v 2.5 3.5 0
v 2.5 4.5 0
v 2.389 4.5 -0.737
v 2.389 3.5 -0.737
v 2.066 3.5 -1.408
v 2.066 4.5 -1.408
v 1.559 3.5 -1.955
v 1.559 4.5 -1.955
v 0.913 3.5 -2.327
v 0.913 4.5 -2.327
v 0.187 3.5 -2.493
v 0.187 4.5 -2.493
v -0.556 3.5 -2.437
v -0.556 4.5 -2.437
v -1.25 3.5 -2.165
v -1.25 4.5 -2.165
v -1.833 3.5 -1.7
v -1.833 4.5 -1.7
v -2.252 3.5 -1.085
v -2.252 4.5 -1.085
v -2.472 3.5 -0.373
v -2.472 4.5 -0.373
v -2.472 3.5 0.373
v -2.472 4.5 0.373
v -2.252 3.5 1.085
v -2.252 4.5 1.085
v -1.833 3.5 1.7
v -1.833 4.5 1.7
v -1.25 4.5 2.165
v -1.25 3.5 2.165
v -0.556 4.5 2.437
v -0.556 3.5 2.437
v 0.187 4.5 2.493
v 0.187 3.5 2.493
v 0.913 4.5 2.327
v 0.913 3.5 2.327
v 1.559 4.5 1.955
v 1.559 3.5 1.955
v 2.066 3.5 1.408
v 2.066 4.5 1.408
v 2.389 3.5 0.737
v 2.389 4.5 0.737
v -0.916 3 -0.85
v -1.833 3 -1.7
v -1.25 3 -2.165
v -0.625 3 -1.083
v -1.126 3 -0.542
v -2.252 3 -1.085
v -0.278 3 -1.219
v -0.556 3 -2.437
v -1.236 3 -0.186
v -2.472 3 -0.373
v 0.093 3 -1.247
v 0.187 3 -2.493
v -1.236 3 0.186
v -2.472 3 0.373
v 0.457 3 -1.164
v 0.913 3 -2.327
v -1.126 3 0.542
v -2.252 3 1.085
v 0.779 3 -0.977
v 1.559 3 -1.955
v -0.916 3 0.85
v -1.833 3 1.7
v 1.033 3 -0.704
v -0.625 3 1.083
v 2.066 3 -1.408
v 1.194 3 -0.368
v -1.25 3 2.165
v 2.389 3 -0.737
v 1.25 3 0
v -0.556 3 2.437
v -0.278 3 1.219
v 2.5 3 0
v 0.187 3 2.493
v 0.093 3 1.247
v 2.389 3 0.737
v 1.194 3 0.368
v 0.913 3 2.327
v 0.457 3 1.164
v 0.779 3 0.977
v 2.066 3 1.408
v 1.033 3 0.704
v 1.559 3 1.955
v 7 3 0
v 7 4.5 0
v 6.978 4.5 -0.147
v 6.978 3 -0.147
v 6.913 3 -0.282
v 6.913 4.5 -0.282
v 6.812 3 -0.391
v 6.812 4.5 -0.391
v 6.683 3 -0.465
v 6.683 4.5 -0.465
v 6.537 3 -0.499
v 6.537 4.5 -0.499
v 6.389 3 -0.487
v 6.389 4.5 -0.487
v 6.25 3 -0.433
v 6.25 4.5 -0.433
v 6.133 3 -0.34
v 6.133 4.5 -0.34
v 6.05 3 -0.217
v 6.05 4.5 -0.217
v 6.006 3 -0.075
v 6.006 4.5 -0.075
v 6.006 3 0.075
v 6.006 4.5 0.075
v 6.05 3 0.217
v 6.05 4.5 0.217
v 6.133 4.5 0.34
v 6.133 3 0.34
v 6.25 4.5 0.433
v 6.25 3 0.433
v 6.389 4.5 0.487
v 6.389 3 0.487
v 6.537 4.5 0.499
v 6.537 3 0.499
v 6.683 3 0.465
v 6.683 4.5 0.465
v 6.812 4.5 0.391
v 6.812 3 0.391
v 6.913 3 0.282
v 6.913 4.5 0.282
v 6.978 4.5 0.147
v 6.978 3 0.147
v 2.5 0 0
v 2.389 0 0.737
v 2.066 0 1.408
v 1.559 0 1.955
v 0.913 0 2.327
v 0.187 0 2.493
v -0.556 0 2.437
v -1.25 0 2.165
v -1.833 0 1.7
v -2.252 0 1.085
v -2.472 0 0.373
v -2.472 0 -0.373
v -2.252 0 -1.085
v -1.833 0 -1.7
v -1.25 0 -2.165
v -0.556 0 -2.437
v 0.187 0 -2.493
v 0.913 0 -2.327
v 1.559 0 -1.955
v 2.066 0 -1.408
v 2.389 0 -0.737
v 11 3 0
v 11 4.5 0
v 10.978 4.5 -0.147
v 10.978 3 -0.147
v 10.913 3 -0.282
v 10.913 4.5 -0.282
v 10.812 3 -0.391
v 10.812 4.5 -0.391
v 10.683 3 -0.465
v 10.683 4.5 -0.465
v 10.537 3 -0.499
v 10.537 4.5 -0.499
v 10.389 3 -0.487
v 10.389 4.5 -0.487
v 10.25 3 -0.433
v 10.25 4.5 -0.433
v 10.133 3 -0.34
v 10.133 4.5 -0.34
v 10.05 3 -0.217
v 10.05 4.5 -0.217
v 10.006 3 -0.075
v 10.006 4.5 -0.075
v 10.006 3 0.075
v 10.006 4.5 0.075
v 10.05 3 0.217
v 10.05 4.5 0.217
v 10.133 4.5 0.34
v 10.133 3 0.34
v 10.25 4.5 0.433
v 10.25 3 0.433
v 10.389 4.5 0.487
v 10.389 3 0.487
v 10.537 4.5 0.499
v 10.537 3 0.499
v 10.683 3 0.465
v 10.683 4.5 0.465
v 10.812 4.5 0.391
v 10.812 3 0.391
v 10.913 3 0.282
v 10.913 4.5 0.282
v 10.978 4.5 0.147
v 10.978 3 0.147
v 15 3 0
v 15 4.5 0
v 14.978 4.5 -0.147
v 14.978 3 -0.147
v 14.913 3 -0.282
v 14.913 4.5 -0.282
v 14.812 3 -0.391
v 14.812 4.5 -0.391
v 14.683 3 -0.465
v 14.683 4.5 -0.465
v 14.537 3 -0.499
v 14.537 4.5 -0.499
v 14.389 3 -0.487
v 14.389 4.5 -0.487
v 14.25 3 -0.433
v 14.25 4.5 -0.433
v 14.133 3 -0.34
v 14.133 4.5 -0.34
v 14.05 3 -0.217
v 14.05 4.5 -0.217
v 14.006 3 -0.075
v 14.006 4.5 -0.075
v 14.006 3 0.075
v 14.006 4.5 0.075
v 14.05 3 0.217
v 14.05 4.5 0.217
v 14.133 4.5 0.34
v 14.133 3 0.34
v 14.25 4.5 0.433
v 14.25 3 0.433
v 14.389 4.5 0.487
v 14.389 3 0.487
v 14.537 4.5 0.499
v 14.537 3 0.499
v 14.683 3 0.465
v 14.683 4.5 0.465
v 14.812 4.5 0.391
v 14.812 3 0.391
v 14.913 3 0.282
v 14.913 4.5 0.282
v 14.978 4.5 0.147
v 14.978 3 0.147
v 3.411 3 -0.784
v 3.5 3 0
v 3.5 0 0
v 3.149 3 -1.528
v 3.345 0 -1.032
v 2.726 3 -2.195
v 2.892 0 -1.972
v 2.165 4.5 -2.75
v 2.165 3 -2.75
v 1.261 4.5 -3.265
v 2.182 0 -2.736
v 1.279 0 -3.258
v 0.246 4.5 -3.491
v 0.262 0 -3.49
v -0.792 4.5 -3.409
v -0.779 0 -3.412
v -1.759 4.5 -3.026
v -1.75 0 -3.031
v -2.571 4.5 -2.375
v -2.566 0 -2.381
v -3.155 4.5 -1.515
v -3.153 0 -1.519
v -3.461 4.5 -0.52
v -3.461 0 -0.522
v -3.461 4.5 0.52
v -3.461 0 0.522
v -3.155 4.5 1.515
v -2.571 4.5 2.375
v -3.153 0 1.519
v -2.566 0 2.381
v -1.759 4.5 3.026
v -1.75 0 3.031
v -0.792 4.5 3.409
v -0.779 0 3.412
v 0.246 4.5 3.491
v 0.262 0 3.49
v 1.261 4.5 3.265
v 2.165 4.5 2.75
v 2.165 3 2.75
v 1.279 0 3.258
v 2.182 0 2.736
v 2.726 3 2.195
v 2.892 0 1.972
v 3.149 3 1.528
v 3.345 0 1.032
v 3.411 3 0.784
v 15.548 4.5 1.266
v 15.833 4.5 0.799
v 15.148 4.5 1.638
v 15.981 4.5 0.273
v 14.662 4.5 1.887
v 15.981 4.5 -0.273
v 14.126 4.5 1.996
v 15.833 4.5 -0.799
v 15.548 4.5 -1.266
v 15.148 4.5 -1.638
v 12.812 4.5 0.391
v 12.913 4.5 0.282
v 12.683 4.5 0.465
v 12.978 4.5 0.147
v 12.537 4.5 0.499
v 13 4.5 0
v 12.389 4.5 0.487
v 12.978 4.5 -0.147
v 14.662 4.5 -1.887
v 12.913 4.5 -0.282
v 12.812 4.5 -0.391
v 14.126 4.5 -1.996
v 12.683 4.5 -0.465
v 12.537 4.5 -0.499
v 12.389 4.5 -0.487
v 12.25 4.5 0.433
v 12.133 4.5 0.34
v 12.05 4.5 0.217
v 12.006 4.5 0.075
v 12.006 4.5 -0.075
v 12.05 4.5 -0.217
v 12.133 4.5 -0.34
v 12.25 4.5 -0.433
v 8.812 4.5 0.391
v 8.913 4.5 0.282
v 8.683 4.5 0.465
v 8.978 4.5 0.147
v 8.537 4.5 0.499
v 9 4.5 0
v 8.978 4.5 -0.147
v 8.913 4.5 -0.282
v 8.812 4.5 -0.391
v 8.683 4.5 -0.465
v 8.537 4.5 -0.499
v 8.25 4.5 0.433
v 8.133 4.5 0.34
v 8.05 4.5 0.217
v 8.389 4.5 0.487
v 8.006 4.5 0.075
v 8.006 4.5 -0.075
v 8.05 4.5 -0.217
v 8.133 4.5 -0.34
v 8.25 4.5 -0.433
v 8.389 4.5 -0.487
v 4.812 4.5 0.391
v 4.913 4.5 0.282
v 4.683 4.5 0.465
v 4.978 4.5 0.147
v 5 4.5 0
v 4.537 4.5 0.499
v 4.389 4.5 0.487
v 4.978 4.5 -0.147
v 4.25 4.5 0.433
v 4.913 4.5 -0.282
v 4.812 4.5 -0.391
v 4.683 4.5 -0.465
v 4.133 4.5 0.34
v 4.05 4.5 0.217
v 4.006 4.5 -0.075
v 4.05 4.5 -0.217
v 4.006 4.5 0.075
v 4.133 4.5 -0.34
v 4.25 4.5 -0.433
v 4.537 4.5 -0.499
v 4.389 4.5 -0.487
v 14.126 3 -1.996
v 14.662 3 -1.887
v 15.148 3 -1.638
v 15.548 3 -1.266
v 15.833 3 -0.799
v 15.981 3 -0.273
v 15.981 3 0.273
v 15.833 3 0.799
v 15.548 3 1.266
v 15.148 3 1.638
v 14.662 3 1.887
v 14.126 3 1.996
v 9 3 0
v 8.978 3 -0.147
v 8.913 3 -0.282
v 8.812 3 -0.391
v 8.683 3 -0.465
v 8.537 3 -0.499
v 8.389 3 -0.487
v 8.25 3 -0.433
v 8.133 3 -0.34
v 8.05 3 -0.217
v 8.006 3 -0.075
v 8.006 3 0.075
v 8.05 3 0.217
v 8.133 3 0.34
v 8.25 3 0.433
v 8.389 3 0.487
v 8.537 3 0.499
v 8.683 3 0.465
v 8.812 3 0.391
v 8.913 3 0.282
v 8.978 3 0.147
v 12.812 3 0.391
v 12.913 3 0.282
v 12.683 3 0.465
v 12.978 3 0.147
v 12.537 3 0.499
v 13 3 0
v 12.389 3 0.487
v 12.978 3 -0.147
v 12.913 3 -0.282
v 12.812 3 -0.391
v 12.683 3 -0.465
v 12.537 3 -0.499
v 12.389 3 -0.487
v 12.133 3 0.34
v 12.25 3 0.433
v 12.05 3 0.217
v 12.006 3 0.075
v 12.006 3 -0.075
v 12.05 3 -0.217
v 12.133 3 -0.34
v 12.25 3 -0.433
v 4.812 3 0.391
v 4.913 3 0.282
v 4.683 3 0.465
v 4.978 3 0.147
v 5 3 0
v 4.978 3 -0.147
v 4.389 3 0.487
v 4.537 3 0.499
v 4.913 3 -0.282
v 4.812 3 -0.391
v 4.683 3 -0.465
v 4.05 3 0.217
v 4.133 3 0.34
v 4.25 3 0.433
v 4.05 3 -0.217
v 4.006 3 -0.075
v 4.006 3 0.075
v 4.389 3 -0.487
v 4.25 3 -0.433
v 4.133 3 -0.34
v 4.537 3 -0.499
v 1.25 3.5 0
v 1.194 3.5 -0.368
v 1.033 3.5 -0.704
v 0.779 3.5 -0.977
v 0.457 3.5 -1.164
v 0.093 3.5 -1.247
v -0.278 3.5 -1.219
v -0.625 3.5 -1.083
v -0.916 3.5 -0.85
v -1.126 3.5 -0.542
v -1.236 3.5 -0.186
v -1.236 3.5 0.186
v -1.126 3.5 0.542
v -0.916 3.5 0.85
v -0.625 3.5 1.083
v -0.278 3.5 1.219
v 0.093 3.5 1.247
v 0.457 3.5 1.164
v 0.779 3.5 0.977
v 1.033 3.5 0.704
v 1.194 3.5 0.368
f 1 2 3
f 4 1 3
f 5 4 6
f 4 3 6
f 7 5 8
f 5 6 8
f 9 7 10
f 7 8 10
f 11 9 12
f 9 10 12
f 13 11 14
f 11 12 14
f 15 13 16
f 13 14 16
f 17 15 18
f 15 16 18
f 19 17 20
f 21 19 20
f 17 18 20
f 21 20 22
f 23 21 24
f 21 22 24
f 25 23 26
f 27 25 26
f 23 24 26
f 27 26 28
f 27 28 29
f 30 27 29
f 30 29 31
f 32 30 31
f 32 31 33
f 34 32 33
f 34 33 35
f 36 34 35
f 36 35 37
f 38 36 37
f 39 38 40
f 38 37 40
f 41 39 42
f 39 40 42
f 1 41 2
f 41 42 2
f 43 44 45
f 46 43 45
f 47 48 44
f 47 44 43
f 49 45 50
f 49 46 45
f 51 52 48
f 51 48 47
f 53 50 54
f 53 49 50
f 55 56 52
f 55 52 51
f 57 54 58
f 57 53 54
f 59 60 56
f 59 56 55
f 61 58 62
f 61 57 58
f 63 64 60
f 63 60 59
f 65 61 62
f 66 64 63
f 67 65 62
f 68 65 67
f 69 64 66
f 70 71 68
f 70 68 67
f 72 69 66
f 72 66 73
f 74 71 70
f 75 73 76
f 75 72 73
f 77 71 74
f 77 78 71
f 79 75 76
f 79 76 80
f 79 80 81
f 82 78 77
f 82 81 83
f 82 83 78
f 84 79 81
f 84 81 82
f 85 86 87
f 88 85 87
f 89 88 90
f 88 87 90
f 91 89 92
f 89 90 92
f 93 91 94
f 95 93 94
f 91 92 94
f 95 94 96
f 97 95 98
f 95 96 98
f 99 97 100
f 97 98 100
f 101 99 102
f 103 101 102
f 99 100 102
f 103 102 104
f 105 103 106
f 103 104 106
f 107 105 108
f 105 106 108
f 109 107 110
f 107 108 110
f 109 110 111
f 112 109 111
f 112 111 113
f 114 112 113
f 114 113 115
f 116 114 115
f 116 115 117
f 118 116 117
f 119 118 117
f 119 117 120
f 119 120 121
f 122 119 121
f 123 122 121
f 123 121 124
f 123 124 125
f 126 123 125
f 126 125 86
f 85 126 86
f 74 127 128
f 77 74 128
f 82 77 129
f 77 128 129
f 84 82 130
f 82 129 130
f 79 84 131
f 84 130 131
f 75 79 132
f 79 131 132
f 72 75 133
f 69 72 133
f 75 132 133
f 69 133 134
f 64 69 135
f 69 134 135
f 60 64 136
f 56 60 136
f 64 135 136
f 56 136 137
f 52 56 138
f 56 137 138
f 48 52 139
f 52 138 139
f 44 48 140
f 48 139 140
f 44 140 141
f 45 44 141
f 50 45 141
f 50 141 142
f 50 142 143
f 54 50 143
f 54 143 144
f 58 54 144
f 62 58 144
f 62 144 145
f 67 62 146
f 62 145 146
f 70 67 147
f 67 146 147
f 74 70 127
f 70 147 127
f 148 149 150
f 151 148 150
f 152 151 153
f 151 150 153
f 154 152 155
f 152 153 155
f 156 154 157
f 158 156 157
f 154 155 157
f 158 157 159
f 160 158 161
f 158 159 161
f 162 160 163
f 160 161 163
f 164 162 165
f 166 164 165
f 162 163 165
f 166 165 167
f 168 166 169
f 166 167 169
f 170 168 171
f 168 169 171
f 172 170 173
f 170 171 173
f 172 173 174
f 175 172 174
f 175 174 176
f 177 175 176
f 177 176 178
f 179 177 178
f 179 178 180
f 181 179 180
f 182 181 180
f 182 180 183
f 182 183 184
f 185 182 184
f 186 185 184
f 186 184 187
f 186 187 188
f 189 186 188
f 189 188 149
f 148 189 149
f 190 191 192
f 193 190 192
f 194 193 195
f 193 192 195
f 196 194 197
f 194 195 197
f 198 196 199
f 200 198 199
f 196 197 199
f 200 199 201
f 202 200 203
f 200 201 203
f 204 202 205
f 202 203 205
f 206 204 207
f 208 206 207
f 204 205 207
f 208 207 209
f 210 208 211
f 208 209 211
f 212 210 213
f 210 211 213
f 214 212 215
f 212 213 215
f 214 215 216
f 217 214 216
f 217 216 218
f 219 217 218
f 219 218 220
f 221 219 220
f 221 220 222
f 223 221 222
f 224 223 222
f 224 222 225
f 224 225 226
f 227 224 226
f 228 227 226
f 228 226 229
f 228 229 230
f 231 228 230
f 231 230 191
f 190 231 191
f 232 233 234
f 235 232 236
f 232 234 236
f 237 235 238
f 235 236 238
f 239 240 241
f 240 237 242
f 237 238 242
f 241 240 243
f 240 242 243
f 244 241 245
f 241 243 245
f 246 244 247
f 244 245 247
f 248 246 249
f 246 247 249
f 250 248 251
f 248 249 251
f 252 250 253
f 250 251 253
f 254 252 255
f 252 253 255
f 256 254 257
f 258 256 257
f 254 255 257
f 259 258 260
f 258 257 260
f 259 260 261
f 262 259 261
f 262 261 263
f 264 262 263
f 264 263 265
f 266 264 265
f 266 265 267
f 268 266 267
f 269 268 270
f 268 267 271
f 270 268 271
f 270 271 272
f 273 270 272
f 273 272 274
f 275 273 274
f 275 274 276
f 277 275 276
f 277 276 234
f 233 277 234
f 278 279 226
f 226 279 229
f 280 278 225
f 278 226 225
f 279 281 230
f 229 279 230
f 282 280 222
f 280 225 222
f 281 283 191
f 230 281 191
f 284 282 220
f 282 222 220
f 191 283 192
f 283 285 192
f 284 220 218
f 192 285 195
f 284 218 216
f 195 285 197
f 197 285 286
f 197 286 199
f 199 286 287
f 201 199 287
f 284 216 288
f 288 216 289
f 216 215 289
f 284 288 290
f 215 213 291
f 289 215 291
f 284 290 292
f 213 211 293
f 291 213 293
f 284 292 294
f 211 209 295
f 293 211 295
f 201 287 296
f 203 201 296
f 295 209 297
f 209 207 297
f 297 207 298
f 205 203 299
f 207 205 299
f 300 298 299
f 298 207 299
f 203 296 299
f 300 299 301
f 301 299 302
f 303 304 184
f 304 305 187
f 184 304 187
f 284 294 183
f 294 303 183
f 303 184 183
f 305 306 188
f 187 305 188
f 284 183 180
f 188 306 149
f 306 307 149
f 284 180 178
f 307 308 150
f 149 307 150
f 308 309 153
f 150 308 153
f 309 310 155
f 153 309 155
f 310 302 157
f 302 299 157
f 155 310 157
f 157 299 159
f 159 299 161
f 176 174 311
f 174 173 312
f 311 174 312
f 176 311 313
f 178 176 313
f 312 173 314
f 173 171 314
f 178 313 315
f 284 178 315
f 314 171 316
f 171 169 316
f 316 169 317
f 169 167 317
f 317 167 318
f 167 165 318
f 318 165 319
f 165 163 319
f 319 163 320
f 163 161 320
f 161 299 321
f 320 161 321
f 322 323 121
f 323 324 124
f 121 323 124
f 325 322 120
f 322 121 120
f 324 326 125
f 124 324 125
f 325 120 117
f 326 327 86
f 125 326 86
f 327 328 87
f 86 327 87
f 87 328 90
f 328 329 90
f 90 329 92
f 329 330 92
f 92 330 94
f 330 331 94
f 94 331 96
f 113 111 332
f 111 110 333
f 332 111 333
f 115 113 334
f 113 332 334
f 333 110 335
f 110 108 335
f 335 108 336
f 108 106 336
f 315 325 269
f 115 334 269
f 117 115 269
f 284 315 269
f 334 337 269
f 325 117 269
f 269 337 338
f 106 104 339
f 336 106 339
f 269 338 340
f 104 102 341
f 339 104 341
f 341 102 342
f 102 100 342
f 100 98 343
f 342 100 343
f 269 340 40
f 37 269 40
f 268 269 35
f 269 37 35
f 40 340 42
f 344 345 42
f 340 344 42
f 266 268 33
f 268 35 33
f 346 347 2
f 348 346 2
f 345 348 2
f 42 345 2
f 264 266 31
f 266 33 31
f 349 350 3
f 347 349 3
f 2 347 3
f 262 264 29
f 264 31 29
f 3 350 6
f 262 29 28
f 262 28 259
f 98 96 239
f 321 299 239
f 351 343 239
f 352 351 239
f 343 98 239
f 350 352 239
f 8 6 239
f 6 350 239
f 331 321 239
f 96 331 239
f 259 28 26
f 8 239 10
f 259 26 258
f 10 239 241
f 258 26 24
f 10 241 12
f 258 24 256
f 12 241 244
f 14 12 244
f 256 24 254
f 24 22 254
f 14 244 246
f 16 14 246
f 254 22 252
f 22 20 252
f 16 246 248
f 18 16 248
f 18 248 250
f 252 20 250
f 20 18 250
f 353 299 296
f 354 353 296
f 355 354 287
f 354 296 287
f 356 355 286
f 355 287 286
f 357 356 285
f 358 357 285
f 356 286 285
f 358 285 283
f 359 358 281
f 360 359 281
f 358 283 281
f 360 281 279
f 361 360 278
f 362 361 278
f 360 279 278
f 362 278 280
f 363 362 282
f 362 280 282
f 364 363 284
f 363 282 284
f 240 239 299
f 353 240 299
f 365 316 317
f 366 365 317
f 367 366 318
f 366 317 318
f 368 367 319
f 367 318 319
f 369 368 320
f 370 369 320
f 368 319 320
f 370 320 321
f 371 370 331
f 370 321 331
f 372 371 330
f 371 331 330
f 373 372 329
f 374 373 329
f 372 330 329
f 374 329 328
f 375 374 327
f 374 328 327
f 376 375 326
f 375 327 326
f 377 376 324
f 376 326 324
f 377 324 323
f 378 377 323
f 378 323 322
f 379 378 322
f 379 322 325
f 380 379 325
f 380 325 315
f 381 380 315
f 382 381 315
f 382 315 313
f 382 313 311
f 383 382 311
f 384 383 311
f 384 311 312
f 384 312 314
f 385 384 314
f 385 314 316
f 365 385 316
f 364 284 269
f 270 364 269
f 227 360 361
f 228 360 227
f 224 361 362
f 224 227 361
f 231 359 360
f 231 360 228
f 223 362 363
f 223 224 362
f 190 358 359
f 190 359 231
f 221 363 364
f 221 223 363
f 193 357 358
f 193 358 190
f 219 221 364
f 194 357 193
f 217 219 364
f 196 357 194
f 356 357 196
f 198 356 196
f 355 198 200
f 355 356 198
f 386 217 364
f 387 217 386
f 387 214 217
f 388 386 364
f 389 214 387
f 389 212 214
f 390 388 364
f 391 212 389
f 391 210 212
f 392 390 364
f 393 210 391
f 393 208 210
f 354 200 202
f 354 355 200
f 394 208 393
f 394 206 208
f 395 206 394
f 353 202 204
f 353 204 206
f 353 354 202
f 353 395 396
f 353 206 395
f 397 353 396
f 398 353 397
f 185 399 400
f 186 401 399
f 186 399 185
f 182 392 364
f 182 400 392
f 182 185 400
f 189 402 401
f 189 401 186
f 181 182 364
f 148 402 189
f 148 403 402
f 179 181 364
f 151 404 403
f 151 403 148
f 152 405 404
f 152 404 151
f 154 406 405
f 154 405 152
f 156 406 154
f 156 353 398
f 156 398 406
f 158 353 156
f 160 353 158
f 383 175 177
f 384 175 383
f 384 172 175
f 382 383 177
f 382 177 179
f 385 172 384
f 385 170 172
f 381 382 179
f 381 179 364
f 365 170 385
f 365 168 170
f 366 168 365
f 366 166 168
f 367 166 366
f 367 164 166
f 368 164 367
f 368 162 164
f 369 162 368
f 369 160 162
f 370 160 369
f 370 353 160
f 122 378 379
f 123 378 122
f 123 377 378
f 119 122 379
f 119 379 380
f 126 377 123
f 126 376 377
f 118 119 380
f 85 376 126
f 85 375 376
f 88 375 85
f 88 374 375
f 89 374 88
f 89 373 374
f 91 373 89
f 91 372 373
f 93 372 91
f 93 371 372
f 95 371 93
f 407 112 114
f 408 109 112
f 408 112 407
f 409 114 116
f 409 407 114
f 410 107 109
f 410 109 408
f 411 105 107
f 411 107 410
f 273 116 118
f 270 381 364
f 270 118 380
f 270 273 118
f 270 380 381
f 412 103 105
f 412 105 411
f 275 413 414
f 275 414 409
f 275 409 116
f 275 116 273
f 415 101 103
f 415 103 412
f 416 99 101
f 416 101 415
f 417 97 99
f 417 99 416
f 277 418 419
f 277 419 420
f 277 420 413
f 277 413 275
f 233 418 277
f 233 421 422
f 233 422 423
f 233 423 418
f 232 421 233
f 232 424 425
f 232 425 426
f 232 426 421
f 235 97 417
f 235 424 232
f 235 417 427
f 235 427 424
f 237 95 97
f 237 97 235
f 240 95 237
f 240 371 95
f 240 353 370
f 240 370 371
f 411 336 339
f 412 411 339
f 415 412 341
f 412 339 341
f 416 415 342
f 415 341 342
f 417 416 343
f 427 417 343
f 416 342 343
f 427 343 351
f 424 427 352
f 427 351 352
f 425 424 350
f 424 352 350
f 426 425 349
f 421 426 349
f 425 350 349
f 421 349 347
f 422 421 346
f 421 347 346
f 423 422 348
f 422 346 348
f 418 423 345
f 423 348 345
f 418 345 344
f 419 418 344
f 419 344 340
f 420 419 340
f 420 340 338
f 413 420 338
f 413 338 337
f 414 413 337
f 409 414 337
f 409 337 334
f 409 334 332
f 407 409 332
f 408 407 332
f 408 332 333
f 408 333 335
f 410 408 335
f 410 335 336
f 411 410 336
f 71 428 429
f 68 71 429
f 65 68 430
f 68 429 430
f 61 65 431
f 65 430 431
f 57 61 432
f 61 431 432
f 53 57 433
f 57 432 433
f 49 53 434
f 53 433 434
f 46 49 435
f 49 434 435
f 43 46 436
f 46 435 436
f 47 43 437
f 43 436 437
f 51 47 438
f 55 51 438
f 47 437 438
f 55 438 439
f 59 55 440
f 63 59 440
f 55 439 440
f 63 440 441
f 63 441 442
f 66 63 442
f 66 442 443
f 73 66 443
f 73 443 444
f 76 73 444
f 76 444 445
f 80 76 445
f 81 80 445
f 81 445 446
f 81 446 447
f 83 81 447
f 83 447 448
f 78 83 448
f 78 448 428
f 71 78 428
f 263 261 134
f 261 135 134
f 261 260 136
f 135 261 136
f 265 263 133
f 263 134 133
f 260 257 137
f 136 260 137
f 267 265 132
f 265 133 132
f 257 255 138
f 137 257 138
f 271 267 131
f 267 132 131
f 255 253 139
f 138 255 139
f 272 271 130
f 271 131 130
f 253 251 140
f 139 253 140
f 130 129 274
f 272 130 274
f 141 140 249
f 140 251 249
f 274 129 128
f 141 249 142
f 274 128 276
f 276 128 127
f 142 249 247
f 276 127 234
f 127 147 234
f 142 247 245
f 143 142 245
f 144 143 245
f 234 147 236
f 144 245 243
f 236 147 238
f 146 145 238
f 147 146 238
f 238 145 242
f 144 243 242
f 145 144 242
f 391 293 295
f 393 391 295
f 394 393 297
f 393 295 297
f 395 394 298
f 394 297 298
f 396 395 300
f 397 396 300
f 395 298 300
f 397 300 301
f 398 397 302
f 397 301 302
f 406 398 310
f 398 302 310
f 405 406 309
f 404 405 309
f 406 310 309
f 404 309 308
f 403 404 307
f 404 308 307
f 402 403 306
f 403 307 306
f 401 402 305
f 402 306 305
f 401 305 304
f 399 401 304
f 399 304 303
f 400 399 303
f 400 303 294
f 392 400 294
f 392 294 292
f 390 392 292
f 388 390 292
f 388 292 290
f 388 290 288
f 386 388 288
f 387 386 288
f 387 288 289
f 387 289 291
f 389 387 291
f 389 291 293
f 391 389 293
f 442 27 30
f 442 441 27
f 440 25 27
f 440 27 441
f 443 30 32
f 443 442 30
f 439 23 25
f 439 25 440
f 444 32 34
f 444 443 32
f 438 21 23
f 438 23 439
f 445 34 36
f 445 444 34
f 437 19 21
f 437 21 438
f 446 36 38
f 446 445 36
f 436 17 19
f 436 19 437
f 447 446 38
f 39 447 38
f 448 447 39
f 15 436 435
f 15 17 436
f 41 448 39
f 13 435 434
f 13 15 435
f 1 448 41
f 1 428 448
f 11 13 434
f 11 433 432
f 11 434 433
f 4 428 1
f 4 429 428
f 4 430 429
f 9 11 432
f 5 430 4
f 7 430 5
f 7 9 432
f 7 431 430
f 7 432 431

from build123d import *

# Parameters (mm, degrees)
SKETCH1_R           = 3.5
BOSS_EXTRUDE1_DEPTH = 4.5
SKETCH2_R           = 2.5
CUT_EXTRUDE1_DEPTH  = 1
SKETCH3_R           = 2.5
CUT_EXTRUDE2_DEPTH  = 3
SKETCH4_R           = 1.25
CUT_EXTRUDE3_DEPTH  = 4.5
BOSS_EXTRUDE2_DEPTH = 1.5
SKETCH6_R           = 0.5
CUT_EXTRUDE4_DEPTH  = 5.5


with BuildPart() as part:
    # Sketch1 → Boss-Extrude1 (new body)
    with BuildSketch(Plane(origin=(0, 0, 0), x_dir=(1, 0, 0), z_dir=(0, 1, 0))):
        Circle(SKETCH1_R)
    extrude(amount=BOSS_EXTRUDE1_DEPTH)

    # Sketch2 → Cut-Extrude1 (cut)
    with BuildSketch(Plane(origin=(0, 4.5, 0), x_dir=(1, 0, 0), z_dir=(0, 1, 0))):
        Circle(SKETCH2_R)
    extrude(amount=-CUT_EXTRUDE1_DEPTH, mode=Mode.SUBTRACT)

    # Sketch3 → Cut-Extrude2 (cut)
    with BuildSketch(Plane.XZ):
        Circle(SKETCH3_R)
    extrude(amount=-CUT_EXTRUDE2_DEPTH, mode=Mode.SUBTRACT)

    # Sketch4 → Cut-Extrude3 (cut, through all)
    with BuildSketch(Plane(origin=(0, 3.5, 0), x_dir=(1, 0, 0), z_dir=(0, 1, 0))):
        Circle(SKETCH4_R)
    extrude(amount=-CUT_EXTRUDE3_DEPTH, mode=Mode.SUBTRACT)

    # Sketch5 → Boss-Extrude2 (add)
    with BuildSketch(Plane(origin=(0, 4.5, 0), x_dir=(1, 0, 0), z_dir=(0, 1, 0))):
        with BuildLine():
            Line((2.165063509, 2.75), (14.125822824, 1.99603823))
            ThreePointArc((14.125822824, 1.99603823), (16, 0), (14.125822824, -1.99603823))
            Line((14.125822824, -1.99603823), (2.165063509, -2.75))
            ThreePointArc((2.165063509, -2.75), (3.5, 0), (2.165063509, 2.75))
        make_face()
    extrude(amount=-BOSS_EXTRUDE2_DEPTH)

    # Sketch6 → Cut-Extrude4 (cut, through all)
    with BuildSketch(Plane(origin=(0, 4.5, 0), x_dir=(1, 0, 0), z_dir=(0, 1, 0))):
        with Locations((4.5, 0)):
            Circle(SKETCH6_R)
        with Locations((6.5, 0)):
            Circle(SKETCH6_R)
        with Locations((8.5, 0)):
            Circle(SKETCH6_R)
        with Locations((10.5, 0)):
            Circle(SKETCH6_R)
        with Locations((12.5, 0)):
            Circle(SKETCH6_R)
        with Locations((14.5, 0)):
            Circle(SKETCH6_R)
    extrude(amount=-CUT_EXTRUDE4_DEPTH, mode=Mode.SUBTRACT)


solid = part.part
